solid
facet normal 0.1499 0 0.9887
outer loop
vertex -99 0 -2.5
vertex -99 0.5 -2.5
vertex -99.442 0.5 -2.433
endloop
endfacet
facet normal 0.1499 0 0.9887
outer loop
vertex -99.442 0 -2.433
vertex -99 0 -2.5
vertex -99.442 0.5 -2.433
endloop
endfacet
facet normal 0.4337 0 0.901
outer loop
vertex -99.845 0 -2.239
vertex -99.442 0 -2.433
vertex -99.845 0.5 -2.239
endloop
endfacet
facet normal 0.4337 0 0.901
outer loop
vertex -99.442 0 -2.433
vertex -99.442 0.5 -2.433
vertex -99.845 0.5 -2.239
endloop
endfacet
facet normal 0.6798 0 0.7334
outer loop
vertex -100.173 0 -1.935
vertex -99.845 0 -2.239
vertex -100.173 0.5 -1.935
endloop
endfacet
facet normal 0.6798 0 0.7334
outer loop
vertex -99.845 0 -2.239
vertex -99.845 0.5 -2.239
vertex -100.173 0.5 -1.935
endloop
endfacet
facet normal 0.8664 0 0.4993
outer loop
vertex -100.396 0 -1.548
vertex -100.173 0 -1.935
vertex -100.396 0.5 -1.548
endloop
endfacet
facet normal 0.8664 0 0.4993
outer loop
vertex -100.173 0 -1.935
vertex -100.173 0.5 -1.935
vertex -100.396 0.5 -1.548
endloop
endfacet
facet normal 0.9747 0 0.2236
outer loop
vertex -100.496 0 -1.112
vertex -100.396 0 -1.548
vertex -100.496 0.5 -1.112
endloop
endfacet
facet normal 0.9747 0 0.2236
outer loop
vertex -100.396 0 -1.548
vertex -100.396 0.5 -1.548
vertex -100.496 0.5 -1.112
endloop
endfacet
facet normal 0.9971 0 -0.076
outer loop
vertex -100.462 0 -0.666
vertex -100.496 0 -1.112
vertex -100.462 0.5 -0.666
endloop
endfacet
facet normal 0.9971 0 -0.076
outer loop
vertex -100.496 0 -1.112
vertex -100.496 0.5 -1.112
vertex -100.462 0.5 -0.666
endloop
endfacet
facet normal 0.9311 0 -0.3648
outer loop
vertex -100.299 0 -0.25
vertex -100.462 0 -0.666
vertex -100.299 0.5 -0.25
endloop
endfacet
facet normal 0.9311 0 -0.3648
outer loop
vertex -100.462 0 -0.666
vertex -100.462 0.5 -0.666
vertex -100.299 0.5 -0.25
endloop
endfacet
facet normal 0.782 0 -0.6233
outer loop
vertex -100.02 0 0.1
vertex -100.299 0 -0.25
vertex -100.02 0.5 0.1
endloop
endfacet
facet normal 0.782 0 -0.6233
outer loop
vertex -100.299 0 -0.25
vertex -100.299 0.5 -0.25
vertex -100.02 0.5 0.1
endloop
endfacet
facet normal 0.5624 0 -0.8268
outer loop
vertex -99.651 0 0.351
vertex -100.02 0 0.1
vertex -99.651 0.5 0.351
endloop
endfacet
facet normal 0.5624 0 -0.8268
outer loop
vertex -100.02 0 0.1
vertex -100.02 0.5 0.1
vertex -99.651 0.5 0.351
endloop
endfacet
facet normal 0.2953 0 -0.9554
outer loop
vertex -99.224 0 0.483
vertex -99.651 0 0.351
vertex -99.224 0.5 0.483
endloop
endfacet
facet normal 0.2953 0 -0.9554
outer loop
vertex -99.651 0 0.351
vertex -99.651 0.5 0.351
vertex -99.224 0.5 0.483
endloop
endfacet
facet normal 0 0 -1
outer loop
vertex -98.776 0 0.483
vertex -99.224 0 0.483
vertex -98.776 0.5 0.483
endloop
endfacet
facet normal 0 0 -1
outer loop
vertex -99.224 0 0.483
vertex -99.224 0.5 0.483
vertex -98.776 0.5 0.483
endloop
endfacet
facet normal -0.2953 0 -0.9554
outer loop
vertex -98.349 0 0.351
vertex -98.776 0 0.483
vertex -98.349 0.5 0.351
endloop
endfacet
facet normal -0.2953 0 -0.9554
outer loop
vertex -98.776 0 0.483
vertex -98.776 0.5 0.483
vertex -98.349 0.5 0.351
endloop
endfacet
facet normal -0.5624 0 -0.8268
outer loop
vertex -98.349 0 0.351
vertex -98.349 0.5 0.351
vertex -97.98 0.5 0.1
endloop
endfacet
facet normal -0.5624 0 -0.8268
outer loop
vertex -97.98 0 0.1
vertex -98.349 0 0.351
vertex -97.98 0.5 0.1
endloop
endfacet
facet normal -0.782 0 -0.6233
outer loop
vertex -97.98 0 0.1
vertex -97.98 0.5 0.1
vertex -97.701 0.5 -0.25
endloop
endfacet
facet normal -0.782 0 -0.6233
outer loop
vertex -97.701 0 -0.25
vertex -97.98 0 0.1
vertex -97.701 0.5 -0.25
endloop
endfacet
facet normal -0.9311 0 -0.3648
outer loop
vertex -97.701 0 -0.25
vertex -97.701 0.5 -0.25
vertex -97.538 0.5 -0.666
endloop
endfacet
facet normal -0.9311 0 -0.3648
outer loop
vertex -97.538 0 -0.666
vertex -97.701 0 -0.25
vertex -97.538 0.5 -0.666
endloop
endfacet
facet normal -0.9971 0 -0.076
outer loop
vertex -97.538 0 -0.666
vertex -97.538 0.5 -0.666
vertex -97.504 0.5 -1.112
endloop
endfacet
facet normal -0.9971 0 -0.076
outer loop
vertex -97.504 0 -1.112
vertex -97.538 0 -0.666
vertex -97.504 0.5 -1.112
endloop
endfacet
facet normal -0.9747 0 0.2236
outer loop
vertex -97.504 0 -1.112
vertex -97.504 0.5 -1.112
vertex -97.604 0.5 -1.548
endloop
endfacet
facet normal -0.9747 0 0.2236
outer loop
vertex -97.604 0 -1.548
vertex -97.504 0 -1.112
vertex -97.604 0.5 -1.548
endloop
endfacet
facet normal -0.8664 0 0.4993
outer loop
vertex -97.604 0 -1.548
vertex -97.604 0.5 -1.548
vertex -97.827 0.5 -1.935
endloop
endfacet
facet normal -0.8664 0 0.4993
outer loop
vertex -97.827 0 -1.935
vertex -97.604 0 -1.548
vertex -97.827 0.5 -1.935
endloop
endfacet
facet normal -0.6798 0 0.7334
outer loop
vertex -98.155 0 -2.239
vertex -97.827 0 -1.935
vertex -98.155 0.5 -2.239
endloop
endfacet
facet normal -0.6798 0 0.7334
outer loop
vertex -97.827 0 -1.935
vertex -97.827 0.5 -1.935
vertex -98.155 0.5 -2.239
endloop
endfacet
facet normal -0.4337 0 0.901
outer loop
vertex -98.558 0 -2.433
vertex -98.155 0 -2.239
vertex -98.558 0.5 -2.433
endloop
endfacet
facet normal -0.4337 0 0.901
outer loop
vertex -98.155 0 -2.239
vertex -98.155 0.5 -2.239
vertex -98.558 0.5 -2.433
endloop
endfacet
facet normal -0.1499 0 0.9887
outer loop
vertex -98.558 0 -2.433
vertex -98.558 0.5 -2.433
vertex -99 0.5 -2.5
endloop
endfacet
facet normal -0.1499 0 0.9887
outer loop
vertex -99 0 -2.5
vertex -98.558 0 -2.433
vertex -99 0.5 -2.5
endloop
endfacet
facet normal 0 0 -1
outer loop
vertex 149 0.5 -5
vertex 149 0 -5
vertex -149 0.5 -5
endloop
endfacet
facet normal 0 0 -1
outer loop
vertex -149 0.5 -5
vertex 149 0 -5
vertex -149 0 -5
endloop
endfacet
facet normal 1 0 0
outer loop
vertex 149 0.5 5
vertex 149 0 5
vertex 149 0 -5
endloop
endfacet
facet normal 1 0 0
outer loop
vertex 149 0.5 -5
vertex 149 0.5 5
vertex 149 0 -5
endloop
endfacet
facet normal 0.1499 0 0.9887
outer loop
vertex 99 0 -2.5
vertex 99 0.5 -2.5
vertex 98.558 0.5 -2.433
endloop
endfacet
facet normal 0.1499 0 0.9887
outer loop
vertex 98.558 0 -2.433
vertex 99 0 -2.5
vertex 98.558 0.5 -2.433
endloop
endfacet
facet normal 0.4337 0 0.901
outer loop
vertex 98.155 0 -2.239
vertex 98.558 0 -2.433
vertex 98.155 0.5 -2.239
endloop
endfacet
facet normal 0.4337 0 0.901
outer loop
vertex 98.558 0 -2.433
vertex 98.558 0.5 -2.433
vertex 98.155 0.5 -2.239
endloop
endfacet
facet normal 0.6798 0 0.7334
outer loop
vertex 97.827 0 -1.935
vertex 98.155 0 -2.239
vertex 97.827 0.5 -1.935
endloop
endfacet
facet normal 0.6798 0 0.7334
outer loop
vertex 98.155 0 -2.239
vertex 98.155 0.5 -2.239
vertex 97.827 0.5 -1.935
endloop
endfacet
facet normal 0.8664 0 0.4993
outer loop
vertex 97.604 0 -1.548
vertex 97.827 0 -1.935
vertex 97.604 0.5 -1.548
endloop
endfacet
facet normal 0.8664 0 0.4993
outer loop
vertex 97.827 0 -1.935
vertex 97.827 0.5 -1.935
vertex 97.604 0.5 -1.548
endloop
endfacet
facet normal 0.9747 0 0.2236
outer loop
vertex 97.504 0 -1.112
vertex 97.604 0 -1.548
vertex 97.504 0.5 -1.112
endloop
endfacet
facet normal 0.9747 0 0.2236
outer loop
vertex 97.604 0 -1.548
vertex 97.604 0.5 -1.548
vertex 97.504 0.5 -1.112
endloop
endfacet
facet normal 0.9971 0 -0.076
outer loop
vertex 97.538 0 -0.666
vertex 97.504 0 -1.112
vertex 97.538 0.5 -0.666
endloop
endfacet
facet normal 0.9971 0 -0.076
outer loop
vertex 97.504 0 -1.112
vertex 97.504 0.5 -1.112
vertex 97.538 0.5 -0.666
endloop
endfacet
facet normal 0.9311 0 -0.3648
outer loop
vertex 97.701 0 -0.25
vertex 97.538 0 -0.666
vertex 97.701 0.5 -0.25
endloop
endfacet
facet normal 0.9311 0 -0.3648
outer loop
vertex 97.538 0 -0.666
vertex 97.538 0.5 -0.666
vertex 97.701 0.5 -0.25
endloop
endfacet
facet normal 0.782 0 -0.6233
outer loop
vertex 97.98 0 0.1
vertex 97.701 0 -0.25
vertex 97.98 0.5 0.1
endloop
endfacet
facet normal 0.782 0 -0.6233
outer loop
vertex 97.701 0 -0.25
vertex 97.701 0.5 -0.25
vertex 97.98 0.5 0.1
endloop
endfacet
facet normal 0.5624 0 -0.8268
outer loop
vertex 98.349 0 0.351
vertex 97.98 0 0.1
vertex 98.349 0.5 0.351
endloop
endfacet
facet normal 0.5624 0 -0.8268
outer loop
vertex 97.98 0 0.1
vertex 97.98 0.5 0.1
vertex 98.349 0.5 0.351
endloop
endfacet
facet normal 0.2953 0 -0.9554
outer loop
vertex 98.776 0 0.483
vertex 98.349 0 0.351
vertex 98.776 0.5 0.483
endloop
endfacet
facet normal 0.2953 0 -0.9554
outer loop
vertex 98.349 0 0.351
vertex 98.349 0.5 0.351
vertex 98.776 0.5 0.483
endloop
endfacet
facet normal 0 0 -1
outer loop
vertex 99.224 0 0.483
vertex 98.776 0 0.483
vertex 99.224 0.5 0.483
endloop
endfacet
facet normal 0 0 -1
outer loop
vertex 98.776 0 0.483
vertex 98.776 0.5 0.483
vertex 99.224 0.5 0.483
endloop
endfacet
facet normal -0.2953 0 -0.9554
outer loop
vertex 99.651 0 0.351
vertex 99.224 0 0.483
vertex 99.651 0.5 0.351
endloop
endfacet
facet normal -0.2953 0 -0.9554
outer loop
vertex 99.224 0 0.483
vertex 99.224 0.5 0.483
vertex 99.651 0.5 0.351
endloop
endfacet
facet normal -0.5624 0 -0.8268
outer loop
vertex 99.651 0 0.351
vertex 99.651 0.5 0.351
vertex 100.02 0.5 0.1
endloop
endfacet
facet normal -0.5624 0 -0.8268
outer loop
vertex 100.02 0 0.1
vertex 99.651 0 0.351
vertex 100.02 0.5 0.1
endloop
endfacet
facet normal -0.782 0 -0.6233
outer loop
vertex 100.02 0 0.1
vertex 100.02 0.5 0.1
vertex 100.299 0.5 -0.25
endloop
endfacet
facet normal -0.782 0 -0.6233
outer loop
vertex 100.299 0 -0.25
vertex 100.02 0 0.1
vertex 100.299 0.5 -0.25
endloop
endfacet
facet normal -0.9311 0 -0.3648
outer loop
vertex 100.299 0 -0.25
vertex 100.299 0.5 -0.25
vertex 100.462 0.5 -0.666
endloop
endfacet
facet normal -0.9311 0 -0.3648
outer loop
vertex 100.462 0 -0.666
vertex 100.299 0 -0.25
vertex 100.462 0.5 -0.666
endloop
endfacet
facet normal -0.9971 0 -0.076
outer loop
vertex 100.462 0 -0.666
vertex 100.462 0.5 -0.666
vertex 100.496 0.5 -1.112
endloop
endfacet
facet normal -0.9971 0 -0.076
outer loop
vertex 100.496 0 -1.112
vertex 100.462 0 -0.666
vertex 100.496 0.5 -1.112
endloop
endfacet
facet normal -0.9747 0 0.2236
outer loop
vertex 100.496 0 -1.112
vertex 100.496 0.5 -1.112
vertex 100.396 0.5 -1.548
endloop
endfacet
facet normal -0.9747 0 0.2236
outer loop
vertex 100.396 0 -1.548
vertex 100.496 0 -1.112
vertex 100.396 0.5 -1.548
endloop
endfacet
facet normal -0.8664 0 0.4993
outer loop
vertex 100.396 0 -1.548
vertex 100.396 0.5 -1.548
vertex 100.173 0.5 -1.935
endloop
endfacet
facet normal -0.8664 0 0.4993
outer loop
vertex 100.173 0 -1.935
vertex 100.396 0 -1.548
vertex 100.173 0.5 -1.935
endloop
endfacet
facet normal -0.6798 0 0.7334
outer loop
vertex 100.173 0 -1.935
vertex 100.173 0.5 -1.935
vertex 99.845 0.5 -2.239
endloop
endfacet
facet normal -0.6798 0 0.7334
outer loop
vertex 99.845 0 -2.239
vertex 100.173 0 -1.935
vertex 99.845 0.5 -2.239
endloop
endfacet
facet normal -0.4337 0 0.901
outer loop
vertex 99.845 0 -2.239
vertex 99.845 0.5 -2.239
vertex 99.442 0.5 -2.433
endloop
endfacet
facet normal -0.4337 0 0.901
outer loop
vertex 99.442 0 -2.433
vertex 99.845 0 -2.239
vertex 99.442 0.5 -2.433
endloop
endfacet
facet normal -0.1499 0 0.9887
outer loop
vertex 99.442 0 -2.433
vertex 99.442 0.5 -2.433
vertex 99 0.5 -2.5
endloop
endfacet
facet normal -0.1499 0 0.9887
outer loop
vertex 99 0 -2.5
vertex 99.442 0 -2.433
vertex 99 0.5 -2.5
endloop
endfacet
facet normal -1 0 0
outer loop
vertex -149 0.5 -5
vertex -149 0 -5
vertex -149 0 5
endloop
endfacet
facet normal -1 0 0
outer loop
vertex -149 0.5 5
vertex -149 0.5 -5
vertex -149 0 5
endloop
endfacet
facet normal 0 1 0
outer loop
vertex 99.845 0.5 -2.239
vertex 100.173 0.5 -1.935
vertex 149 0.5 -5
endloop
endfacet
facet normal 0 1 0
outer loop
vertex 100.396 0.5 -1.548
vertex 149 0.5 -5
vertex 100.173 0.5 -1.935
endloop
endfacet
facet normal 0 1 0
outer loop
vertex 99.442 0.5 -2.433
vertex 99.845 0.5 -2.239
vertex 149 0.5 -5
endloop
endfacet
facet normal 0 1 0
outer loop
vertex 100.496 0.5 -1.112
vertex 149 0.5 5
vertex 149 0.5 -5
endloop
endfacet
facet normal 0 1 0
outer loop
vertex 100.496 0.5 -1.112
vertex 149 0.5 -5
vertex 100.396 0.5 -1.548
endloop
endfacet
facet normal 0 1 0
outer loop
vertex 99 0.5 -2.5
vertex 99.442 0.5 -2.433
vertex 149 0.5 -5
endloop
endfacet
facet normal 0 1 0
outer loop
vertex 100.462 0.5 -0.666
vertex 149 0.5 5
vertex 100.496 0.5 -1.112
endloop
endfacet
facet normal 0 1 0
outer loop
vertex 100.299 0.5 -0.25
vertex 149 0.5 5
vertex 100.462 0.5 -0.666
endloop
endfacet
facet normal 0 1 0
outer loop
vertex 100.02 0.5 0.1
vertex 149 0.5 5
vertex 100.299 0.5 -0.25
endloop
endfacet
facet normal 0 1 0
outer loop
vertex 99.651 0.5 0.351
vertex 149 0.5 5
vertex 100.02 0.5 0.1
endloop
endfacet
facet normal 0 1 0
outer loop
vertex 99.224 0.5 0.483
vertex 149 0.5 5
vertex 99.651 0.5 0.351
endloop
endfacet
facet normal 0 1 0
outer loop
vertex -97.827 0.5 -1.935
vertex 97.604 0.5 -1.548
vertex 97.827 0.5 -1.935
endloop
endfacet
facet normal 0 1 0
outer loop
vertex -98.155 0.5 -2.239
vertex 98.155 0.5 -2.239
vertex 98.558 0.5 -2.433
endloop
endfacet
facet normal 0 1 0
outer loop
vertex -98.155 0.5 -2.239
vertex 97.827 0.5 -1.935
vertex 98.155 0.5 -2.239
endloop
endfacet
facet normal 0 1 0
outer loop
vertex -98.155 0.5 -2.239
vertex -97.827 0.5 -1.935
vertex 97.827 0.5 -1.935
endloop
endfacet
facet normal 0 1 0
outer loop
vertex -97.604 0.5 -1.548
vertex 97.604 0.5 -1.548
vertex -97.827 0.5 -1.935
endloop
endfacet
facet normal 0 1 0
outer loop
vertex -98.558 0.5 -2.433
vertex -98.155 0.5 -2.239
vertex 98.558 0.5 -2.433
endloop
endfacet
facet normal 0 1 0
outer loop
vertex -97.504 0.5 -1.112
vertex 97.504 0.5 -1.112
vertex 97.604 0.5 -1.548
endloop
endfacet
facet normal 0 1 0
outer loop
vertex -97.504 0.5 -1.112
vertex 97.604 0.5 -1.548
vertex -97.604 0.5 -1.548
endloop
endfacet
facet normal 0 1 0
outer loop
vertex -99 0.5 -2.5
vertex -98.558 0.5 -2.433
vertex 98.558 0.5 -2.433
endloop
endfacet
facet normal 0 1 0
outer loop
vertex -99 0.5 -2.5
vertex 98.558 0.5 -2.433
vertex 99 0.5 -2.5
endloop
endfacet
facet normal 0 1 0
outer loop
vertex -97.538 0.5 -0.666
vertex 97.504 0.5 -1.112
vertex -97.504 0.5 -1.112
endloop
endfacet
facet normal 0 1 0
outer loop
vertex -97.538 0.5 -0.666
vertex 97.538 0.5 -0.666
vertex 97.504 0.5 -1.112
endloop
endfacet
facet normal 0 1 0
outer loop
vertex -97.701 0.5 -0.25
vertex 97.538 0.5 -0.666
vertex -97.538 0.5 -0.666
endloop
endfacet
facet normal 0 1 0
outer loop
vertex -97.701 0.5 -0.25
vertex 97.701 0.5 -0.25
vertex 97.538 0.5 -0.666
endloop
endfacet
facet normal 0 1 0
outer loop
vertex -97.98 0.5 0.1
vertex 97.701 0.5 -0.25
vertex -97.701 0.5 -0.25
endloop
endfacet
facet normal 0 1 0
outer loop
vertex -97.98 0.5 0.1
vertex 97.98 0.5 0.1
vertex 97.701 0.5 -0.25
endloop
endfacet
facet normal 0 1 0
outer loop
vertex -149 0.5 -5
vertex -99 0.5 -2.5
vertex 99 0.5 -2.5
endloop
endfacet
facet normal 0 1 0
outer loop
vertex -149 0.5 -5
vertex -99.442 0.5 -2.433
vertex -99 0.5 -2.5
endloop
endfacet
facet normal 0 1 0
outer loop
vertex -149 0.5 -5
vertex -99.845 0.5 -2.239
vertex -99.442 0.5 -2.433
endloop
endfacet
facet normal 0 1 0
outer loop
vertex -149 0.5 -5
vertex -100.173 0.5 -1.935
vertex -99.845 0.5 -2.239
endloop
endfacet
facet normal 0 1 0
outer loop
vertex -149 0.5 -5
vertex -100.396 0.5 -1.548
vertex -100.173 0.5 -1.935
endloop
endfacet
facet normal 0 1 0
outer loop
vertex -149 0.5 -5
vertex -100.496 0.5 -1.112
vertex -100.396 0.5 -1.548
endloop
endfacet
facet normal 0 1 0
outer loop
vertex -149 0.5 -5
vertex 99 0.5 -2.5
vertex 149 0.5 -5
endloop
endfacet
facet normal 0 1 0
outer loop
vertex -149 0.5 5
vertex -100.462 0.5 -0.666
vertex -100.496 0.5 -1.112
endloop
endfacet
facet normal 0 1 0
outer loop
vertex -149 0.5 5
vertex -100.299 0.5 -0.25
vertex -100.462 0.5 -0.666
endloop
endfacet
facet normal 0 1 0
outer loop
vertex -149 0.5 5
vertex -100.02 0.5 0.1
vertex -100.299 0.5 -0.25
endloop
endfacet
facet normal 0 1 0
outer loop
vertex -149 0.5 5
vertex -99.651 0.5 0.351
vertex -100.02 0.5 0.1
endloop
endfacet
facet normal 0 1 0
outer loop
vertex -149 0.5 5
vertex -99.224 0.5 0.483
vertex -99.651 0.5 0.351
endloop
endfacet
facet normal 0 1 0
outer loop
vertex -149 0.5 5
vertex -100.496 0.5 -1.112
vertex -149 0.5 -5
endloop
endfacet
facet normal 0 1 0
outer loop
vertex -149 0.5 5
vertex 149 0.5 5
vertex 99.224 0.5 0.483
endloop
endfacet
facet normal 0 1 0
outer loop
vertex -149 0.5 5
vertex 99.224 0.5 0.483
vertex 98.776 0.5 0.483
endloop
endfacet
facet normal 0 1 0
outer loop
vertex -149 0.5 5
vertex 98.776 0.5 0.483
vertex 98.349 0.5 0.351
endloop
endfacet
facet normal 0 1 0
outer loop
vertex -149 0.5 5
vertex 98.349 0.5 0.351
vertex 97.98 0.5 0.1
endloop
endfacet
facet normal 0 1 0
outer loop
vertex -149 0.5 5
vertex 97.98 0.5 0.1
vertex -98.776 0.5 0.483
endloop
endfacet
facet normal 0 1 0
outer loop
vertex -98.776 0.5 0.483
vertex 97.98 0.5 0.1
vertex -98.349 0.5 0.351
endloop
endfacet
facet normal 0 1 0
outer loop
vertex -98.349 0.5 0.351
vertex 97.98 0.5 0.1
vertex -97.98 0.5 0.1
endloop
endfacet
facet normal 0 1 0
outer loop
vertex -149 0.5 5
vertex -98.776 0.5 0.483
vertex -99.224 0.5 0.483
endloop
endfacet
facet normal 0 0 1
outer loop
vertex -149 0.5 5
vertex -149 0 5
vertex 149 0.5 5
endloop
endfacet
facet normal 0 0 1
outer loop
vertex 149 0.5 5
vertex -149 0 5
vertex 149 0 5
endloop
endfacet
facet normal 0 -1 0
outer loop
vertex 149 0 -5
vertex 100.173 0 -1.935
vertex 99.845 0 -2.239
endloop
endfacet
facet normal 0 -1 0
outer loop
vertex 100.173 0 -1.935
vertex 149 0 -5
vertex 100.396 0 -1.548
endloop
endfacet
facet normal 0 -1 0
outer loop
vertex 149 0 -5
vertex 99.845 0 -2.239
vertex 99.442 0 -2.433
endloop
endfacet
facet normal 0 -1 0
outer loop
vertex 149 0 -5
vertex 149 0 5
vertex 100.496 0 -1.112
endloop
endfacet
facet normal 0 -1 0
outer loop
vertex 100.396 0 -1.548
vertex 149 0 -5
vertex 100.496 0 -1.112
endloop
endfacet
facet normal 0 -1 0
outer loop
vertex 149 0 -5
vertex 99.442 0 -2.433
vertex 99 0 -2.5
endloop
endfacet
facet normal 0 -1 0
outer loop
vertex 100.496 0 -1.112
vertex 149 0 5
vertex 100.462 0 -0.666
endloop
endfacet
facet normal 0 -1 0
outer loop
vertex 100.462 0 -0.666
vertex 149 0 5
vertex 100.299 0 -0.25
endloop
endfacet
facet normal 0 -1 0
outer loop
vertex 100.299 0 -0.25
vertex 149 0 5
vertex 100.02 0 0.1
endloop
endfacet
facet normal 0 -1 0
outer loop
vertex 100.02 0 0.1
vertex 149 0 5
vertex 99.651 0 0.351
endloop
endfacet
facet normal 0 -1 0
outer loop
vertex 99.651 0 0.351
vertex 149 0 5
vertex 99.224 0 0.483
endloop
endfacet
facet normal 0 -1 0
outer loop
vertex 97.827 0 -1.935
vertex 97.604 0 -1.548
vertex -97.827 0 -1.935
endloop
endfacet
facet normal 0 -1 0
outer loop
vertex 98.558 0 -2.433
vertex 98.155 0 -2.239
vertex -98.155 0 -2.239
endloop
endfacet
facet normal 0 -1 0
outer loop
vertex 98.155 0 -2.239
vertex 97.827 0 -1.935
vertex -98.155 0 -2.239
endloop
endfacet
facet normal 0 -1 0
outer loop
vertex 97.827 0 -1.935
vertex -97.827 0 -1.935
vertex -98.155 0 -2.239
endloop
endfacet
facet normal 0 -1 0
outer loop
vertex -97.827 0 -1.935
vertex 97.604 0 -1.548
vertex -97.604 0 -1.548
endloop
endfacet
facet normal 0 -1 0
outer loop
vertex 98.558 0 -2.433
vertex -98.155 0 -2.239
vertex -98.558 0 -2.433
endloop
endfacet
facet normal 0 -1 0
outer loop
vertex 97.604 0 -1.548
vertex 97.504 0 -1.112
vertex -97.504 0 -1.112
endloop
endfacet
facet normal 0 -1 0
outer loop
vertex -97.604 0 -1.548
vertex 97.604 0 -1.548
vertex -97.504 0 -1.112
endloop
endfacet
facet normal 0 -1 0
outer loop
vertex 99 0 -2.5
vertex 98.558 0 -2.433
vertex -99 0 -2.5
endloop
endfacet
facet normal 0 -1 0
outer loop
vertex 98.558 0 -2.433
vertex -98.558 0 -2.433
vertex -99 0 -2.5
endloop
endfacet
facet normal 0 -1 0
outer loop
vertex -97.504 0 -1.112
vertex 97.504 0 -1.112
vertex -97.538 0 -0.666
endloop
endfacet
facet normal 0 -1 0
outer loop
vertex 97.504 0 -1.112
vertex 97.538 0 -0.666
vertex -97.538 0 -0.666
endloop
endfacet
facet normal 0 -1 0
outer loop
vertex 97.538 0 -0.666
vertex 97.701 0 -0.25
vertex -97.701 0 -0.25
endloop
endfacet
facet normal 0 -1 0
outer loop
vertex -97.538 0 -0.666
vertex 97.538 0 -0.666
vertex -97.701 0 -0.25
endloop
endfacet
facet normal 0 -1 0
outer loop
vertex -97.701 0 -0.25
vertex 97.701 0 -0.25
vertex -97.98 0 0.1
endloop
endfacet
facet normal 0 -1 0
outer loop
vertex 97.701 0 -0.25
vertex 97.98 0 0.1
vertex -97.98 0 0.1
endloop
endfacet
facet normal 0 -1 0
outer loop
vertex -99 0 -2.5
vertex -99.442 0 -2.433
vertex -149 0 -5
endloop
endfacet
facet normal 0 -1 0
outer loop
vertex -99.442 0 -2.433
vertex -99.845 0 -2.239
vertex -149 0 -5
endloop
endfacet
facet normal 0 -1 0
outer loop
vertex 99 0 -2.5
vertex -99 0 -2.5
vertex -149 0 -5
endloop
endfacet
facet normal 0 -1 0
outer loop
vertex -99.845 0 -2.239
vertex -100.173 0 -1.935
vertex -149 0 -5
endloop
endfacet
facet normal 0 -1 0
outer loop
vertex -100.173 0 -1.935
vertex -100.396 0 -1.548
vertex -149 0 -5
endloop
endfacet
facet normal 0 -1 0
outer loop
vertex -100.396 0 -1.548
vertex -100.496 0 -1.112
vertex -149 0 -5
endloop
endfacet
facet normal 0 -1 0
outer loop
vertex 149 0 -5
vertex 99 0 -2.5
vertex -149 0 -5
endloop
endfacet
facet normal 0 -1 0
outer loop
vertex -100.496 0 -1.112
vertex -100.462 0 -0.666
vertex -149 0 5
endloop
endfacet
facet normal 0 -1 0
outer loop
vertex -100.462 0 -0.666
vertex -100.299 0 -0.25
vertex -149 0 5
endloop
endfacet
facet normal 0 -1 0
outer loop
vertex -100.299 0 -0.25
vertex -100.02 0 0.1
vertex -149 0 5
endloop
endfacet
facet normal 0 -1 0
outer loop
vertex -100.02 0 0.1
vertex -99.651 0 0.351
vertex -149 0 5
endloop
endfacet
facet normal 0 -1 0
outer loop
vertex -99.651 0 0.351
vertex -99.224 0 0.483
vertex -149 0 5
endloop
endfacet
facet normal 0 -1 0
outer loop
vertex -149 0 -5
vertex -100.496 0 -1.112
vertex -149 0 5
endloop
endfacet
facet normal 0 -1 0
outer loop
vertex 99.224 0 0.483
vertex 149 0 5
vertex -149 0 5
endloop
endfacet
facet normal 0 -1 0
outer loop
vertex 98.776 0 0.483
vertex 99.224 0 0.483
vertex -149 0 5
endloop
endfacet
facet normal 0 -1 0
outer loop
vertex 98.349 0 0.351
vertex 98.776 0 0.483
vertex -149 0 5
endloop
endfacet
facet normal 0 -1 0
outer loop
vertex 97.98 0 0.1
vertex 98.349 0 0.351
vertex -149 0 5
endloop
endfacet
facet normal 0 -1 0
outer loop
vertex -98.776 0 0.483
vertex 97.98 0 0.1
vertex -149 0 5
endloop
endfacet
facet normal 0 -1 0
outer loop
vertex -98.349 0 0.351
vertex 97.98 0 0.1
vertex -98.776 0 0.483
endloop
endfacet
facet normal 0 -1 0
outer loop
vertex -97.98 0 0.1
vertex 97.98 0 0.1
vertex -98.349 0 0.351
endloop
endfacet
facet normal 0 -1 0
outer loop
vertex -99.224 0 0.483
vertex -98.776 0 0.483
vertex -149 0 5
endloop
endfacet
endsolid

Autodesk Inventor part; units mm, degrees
ref_plane "YZ Plane" through (0, 0, 0) normal (1, 0, 0) x (0, 1, 0)
ref_plane "XZ Plane" through (0, 0, 0) normal (0, 1, 0) x (-1, 0, 0)
ref_plane "XY Plane" through (0, 0, 0) normal (0, 0, 1) x (1, 0, 0)
sketch "Esboço1" plane through (0, 0, 0) normal (0, 1, 0) x (-1, 0, 0)
  line L0 (149, 5) -> (-149, 5)
  line L1 (-149, 5) -> (-149, -5)
  line L2 (-149, -5) -> (149, -5)
  line L3 (149, -5) -> (149, 5)
  line L4 (149, 5) -> (-149, -5) construction
  line L5 (-149, 5) -> (149, -5) construction
  point P0 (0, 0)
  dimension "d0" = 298
  dimension "d1" = 10
extrude "Placa1" add sketch "Esboço1" along normal blind 0.5
sketch "Esboço2" plane through (0, 0, 0) normal (0, -1, 0) x (1, 0, 0)
  line L0 (149, -5) -> (-149, -5) projected
  line L1 (149, 5) -> (149, -5) projected
  line L2 (-149, -5) -> (-149, 5) projected
  point P0 (0, 0)
  point P1 (-99, -1)
  point P2 (99, -1)
  dimension "d3" = 4
  dimension "d4" = 4
  dimension "d5" = 50
  dimension "d6" = 50
hole "Furo1" at (-99, 0, -1) at (99, 0, -1) direction (0, 1, 0) diameter 3 end through all
equation "\"d12\" = Espessura"
equation "\"d2\" = Espessura"
equation "\"Raio_vergadura\" = Espessura"
equation "\"Largura_alívio_de_vergadura\" = Espessura"
equation "\"Profundidade_alívio_de_vergadura\" = 0.5 * Espessura"
equation "\"Tamanho_alívio_de_dobra\" = 4 * Espessura"
equation "\"Remanescente_mínimo\" = 2 * Espessura"
equation "\"Raiodetransição\" = Raio_vergadura"
equation "\"Tamanho_de_raio_de_Jacobi\" = Raio_vergadura"
equation "\"TamanhoFolga\" = Espessura"
equation "\"Espessura\" = 0.5"
properties part number "Lateral 1 Gaveta" material "PMMA plástico"
